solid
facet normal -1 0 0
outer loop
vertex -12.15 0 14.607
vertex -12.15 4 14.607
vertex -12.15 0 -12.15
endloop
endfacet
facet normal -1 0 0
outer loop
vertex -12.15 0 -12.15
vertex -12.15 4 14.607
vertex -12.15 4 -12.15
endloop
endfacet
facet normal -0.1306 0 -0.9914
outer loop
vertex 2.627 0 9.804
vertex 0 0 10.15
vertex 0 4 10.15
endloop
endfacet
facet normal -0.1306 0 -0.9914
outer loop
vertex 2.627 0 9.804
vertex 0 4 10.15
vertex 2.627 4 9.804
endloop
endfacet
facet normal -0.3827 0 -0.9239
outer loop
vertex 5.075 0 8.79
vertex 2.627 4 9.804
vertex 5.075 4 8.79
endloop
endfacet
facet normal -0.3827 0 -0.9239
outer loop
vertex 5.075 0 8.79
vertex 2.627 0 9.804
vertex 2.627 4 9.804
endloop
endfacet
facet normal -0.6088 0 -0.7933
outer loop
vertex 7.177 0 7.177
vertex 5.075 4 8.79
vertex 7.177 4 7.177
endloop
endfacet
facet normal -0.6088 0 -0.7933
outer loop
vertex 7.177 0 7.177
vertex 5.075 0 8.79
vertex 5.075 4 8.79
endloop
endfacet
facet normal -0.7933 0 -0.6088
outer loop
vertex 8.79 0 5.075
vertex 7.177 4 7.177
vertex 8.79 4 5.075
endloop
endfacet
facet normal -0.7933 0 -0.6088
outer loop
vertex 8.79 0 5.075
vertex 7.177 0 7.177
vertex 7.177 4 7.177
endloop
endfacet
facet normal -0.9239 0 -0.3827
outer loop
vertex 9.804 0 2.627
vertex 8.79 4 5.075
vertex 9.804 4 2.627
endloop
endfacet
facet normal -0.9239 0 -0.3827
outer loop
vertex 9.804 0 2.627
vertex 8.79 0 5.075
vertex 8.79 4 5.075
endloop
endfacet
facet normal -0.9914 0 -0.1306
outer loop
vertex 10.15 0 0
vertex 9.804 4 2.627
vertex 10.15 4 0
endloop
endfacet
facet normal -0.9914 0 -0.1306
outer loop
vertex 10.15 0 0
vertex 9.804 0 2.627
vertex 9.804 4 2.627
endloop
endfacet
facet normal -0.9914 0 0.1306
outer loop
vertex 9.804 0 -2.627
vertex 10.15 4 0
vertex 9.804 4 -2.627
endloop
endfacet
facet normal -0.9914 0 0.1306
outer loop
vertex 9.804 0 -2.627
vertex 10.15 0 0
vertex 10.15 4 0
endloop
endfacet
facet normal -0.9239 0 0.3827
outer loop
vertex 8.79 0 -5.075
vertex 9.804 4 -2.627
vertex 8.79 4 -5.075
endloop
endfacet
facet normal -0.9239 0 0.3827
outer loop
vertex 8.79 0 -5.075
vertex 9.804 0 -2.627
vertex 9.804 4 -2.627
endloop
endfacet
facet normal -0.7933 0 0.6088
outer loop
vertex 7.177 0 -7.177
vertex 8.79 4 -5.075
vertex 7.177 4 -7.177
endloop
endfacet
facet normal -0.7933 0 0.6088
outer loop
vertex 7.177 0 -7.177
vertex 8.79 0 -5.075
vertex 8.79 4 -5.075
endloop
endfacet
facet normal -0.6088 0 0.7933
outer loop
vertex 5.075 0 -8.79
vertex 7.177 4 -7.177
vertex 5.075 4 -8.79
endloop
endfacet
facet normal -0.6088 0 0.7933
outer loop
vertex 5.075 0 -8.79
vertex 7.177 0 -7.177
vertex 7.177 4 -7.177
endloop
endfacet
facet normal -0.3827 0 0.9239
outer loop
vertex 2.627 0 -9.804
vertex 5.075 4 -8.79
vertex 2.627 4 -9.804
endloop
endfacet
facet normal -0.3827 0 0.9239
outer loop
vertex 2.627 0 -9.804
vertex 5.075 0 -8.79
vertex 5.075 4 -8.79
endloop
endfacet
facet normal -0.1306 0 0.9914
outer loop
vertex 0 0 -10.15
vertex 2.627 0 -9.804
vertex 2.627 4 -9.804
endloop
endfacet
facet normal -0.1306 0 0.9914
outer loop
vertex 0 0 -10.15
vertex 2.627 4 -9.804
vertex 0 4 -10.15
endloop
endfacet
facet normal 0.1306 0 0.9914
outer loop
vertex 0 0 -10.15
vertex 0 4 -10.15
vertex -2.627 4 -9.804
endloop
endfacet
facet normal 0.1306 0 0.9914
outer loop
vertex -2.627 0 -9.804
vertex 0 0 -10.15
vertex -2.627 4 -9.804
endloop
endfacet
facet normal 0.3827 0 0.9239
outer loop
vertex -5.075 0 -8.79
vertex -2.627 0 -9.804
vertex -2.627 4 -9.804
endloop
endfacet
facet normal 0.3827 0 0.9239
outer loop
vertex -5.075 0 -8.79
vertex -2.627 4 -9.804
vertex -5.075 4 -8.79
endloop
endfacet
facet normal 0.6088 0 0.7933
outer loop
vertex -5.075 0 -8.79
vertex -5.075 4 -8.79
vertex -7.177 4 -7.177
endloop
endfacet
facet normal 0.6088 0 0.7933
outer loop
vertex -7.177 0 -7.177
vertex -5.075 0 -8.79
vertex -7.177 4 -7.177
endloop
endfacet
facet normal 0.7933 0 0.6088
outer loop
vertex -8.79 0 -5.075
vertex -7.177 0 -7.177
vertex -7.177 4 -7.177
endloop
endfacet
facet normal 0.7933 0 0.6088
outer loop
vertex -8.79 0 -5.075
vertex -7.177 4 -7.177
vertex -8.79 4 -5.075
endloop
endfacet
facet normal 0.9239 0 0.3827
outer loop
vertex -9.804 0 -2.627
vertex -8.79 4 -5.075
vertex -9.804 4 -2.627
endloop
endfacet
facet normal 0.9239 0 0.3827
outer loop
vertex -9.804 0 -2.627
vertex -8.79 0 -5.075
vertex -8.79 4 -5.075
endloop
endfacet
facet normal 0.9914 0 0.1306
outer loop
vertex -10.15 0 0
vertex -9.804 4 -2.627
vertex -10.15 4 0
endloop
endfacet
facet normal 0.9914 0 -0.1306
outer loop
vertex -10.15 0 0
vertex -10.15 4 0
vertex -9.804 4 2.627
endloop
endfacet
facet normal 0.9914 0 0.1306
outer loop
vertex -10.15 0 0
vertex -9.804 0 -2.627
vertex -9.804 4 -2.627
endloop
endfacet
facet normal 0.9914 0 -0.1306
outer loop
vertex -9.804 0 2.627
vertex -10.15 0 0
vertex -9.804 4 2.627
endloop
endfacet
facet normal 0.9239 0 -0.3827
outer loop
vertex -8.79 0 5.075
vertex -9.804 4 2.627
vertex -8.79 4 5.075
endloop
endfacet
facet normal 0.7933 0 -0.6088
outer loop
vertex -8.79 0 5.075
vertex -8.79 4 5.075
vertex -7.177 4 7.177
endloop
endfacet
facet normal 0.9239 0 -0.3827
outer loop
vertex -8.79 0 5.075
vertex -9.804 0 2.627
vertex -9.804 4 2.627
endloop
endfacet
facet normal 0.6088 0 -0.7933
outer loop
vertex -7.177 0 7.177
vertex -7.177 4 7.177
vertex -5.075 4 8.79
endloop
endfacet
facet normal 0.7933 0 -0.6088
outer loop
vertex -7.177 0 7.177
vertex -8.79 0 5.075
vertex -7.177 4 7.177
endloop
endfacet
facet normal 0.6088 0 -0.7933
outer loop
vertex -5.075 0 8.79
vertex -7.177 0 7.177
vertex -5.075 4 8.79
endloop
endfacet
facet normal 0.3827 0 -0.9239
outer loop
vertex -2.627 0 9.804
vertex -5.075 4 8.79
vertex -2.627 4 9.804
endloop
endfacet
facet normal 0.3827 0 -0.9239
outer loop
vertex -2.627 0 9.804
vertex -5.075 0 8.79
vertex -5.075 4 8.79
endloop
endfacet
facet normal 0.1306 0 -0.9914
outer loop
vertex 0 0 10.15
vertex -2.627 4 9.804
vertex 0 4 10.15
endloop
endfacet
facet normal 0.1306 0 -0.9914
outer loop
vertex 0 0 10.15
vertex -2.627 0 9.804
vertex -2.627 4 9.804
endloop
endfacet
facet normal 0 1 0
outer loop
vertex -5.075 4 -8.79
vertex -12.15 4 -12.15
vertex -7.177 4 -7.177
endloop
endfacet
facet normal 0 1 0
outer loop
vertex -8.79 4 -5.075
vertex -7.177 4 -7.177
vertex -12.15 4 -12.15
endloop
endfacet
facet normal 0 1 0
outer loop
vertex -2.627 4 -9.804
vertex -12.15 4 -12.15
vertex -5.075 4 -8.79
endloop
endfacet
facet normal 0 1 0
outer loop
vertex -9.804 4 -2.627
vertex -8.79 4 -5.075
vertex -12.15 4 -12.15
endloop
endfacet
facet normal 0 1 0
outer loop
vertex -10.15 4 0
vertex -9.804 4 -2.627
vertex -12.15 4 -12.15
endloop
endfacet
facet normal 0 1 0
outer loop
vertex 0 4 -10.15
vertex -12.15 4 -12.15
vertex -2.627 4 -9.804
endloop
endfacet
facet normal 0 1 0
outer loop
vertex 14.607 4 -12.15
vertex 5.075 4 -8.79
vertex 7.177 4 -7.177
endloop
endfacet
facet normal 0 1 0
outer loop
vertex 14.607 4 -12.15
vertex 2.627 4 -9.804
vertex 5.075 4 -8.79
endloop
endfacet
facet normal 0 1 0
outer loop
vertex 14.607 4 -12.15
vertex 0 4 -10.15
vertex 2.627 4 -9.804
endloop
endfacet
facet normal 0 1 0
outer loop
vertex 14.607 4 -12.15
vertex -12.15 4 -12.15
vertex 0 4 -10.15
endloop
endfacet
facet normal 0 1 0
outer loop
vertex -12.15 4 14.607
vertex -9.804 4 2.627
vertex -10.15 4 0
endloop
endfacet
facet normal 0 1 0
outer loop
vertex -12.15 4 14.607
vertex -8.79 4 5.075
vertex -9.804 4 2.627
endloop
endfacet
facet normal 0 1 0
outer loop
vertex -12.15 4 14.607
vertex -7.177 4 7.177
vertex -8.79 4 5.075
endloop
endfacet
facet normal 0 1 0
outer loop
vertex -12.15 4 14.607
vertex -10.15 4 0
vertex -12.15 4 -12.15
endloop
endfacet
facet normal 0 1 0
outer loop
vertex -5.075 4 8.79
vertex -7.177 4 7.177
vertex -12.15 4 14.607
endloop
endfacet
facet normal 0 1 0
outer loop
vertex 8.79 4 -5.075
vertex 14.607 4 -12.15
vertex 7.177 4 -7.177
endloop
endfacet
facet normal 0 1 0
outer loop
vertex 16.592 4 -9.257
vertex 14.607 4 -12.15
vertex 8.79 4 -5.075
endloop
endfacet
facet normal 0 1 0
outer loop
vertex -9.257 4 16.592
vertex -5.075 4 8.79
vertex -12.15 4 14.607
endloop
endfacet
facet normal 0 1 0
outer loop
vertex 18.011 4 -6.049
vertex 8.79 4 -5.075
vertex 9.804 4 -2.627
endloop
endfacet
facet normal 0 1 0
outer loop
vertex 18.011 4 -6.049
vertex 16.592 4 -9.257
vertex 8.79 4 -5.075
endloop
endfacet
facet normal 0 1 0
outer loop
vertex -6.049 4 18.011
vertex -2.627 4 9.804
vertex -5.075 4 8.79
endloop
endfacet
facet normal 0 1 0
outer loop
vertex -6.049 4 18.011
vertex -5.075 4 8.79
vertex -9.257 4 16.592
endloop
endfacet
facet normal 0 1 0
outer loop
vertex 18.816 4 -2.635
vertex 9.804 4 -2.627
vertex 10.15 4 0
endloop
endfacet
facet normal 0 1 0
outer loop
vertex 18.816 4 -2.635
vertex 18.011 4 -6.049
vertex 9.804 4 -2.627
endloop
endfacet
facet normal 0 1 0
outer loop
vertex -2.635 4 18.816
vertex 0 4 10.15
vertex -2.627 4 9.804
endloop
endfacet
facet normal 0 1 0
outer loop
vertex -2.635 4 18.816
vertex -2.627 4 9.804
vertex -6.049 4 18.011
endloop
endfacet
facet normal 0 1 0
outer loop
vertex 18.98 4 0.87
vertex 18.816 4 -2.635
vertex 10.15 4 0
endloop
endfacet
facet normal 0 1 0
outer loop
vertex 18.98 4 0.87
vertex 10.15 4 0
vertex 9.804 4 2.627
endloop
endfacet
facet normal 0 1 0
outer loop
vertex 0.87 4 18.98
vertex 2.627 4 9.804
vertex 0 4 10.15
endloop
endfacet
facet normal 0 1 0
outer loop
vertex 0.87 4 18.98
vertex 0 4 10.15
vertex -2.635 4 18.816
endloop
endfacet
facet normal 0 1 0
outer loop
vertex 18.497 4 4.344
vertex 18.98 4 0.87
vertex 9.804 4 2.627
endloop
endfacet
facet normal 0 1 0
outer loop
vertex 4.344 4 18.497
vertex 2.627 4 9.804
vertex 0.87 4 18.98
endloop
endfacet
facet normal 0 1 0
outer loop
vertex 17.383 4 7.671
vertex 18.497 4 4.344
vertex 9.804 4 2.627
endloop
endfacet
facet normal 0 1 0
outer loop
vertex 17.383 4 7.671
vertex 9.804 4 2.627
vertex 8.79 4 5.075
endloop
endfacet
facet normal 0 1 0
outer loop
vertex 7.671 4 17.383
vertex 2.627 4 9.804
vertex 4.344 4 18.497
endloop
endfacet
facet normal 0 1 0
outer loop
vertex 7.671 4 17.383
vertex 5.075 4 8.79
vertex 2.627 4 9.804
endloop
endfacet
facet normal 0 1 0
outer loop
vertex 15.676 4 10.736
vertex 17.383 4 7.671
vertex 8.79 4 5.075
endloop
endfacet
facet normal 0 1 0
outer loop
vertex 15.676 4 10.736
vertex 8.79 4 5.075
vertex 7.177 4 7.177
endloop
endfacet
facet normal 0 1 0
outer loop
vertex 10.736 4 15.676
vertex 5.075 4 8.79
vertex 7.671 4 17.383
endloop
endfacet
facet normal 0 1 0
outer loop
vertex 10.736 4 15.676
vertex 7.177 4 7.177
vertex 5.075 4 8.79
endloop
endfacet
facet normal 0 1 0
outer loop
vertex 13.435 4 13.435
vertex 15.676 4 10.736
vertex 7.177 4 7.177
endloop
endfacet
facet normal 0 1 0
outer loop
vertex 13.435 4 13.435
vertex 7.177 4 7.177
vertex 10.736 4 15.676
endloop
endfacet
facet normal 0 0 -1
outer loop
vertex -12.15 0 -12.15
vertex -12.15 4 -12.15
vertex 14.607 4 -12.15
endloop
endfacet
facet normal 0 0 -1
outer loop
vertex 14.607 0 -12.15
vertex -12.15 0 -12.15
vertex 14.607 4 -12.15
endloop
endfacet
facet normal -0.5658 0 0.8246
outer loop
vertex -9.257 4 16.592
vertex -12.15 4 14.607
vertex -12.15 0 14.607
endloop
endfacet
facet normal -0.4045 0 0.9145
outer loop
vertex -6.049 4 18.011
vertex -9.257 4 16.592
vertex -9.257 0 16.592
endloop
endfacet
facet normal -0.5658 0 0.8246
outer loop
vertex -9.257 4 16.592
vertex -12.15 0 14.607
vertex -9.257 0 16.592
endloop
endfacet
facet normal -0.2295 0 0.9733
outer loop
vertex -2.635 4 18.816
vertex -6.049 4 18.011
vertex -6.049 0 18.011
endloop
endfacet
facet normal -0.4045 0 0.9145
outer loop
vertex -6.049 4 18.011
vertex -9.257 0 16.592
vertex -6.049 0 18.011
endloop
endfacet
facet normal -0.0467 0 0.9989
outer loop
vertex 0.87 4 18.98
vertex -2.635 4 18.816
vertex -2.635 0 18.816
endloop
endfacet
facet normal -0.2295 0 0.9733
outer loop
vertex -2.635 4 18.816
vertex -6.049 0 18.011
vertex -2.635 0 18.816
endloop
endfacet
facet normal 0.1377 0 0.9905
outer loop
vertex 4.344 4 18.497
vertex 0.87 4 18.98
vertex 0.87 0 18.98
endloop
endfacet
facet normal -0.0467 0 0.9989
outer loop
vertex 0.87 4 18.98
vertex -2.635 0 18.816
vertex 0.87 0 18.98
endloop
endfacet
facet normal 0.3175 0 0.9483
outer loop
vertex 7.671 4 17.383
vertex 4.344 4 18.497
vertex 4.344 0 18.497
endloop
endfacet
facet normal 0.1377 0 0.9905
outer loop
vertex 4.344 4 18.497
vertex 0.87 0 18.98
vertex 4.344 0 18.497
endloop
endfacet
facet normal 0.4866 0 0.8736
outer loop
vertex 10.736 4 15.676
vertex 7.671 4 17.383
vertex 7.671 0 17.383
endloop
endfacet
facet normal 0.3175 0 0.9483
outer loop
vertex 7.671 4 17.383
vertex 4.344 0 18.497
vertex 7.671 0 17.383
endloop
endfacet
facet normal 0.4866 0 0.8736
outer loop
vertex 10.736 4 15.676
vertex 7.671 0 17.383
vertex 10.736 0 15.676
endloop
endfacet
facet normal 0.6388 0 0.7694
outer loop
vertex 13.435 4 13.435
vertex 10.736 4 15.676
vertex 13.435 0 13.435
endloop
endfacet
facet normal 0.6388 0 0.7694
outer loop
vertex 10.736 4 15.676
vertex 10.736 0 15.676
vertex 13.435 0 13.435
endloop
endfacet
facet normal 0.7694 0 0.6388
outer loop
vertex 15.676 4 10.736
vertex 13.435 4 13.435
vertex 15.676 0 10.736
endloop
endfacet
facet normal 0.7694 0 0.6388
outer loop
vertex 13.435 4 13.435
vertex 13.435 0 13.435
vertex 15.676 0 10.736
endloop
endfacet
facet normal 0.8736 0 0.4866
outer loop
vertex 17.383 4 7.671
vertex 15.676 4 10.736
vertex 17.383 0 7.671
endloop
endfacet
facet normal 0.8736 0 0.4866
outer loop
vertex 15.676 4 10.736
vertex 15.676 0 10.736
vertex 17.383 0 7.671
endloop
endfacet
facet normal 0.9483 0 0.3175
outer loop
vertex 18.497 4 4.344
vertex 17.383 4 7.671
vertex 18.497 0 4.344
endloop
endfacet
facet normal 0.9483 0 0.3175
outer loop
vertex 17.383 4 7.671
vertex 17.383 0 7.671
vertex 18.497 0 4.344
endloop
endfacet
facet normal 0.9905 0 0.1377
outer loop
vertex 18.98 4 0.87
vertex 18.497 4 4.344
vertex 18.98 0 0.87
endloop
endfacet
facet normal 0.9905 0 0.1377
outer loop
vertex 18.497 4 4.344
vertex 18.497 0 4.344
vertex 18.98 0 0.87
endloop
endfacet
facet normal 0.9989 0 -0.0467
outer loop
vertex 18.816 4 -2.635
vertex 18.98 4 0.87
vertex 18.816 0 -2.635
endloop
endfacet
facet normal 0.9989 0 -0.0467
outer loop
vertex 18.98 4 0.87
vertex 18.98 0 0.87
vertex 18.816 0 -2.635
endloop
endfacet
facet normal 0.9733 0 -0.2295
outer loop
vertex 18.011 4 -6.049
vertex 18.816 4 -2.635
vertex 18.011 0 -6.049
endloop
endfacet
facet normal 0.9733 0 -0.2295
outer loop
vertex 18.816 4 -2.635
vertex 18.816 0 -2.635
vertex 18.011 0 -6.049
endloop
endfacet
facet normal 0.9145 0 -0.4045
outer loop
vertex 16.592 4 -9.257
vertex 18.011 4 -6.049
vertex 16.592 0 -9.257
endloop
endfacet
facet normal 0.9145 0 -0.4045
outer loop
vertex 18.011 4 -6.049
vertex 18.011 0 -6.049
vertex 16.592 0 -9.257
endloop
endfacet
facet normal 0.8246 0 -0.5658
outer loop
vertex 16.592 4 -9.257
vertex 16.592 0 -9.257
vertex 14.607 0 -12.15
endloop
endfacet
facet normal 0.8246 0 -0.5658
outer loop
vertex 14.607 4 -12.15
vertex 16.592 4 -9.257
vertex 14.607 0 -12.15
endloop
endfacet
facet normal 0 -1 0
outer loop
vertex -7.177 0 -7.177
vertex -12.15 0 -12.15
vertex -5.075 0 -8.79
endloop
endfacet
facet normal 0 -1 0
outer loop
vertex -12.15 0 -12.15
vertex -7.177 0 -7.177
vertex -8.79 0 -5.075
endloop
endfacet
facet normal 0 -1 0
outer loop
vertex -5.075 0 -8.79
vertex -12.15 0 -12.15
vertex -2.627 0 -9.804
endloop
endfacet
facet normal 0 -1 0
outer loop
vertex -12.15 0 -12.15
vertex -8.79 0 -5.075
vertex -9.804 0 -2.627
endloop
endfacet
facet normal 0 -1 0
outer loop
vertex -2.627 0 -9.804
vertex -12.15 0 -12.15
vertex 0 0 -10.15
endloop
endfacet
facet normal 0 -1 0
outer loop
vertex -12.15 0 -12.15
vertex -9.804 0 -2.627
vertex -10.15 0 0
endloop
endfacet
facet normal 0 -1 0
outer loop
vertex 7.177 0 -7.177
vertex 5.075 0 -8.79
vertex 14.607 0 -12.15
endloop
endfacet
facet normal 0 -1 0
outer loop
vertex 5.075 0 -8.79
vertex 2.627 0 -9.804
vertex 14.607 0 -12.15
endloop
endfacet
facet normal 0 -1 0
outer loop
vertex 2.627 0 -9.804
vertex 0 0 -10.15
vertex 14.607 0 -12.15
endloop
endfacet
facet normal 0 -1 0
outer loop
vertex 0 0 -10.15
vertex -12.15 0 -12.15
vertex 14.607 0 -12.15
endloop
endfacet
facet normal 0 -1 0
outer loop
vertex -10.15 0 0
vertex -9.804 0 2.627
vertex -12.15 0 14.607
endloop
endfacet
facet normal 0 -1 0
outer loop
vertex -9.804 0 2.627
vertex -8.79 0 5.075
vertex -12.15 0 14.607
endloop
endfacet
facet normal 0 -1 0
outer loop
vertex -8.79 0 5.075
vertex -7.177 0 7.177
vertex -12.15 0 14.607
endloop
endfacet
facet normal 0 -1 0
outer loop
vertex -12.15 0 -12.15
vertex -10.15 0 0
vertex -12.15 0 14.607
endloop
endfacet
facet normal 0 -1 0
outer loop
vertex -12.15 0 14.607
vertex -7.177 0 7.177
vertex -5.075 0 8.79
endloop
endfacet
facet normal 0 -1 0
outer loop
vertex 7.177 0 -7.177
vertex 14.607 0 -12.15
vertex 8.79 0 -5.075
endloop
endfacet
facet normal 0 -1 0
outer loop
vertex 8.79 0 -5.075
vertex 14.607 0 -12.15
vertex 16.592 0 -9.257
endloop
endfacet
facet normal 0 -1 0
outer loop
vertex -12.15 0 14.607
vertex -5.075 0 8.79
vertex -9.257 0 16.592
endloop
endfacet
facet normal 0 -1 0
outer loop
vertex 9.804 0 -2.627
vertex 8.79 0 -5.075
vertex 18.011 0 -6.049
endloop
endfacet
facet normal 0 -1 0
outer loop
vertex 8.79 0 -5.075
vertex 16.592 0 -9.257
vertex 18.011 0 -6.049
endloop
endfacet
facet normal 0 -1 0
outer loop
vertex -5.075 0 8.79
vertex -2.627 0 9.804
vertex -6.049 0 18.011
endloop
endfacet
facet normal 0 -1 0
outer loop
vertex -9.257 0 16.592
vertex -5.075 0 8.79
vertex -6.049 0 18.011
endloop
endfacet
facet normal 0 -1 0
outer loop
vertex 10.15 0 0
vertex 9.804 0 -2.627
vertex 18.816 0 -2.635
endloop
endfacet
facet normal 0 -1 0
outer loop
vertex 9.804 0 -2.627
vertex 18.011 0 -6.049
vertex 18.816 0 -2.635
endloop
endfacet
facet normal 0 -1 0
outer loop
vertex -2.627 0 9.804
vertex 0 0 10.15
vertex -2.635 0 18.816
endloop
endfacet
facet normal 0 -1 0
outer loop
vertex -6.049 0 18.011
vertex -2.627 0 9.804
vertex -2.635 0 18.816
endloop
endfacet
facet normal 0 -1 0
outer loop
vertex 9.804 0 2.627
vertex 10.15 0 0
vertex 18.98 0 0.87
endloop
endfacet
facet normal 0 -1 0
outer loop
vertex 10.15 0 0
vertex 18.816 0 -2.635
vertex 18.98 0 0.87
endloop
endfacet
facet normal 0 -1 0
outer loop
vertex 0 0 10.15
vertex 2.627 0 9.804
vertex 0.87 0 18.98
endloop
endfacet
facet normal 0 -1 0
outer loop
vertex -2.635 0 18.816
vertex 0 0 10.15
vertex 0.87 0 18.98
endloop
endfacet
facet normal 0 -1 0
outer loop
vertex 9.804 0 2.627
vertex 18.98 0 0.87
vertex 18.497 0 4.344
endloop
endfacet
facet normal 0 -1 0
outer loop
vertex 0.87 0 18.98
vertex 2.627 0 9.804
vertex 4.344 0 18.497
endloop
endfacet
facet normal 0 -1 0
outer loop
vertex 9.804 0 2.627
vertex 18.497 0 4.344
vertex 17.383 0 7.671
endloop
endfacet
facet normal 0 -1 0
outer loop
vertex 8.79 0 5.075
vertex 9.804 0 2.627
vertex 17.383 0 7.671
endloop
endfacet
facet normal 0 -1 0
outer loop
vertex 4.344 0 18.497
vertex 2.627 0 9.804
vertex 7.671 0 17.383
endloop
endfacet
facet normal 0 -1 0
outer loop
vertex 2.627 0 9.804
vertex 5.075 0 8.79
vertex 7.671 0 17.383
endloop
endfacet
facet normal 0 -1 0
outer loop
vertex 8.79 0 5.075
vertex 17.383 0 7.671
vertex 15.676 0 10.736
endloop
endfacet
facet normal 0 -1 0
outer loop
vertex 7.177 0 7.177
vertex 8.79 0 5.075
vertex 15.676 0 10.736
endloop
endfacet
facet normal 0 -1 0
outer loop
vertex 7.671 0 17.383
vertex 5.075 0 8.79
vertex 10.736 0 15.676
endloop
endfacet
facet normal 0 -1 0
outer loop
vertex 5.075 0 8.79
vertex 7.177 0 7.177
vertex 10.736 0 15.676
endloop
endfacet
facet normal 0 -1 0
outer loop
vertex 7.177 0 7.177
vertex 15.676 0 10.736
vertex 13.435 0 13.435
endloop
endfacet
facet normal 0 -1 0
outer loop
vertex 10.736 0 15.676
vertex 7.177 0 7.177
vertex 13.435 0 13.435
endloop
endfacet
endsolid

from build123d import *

# Parameters (mm, degrees)
SKETCH_1_R          = 19
SKETCH_1_R_2        = 10.15
EXTRUDE_2_DEPTH     = 4
SKETCH_3_W          = 38
SKETCH_3_H          = 10
CUT_EXTRUDE_8_DEPTH = 28.166155414
SKETCH_4_W          = 10
SKETCH_4_H          = 31.15
CUT_EXTRUDE_9_DEPTH = 28.166155414


with BuildPart() as part:
    # 草图1 → 凸台-拉伸2 (new body)
    with BuildSketch(Plane(origin=(0, 0, 0), x_dir=(1, 0, 0), z_dir=(0, 1, 0))):
        with Locations(Location((0, 0, 0), (0, 0, 270))):
            Circle(SKETCH_1_R)
        with Locations(Location((0, 0, 0), (0, 0, 270))):
            Circle(SKETCH_1_R_2, mode=Mode.SUBTRACT)
    extrude(amount=EXTRUDE_2_DEPTH)

    # 草图3 → 切除-拉伸8 (cut, through all)
    with BuildSketch(Plane(origin=(0, 4, 0), x_dir=(1, 0, 0), z_dir=(0, 1, 0))):
        with Locations((0, 17.15)):
            Rectangle(SKETCH_3_W, SKETCH_3_H)
    extrude(amount=-CUT_EXTRUDE_8_DEPTH, mode=Mode.SUBTRACT)

    # 草图4 → 切除-拉伸9 (cut, through all)
    with BuildSketch(Plane(origin=(0, 4, 0), x_dir=(1, 0, 0), z_dir=(0, 1, 0))):
        with Locations((-17.15, -3.425)):
            Rectangle(SKETCH_4_W, SKETCH_4_H)
    extrude(amount=-CUT_EXTRUDE_9_DEPTH, mode=Mode.SUBTRACT)


solid = part.part
